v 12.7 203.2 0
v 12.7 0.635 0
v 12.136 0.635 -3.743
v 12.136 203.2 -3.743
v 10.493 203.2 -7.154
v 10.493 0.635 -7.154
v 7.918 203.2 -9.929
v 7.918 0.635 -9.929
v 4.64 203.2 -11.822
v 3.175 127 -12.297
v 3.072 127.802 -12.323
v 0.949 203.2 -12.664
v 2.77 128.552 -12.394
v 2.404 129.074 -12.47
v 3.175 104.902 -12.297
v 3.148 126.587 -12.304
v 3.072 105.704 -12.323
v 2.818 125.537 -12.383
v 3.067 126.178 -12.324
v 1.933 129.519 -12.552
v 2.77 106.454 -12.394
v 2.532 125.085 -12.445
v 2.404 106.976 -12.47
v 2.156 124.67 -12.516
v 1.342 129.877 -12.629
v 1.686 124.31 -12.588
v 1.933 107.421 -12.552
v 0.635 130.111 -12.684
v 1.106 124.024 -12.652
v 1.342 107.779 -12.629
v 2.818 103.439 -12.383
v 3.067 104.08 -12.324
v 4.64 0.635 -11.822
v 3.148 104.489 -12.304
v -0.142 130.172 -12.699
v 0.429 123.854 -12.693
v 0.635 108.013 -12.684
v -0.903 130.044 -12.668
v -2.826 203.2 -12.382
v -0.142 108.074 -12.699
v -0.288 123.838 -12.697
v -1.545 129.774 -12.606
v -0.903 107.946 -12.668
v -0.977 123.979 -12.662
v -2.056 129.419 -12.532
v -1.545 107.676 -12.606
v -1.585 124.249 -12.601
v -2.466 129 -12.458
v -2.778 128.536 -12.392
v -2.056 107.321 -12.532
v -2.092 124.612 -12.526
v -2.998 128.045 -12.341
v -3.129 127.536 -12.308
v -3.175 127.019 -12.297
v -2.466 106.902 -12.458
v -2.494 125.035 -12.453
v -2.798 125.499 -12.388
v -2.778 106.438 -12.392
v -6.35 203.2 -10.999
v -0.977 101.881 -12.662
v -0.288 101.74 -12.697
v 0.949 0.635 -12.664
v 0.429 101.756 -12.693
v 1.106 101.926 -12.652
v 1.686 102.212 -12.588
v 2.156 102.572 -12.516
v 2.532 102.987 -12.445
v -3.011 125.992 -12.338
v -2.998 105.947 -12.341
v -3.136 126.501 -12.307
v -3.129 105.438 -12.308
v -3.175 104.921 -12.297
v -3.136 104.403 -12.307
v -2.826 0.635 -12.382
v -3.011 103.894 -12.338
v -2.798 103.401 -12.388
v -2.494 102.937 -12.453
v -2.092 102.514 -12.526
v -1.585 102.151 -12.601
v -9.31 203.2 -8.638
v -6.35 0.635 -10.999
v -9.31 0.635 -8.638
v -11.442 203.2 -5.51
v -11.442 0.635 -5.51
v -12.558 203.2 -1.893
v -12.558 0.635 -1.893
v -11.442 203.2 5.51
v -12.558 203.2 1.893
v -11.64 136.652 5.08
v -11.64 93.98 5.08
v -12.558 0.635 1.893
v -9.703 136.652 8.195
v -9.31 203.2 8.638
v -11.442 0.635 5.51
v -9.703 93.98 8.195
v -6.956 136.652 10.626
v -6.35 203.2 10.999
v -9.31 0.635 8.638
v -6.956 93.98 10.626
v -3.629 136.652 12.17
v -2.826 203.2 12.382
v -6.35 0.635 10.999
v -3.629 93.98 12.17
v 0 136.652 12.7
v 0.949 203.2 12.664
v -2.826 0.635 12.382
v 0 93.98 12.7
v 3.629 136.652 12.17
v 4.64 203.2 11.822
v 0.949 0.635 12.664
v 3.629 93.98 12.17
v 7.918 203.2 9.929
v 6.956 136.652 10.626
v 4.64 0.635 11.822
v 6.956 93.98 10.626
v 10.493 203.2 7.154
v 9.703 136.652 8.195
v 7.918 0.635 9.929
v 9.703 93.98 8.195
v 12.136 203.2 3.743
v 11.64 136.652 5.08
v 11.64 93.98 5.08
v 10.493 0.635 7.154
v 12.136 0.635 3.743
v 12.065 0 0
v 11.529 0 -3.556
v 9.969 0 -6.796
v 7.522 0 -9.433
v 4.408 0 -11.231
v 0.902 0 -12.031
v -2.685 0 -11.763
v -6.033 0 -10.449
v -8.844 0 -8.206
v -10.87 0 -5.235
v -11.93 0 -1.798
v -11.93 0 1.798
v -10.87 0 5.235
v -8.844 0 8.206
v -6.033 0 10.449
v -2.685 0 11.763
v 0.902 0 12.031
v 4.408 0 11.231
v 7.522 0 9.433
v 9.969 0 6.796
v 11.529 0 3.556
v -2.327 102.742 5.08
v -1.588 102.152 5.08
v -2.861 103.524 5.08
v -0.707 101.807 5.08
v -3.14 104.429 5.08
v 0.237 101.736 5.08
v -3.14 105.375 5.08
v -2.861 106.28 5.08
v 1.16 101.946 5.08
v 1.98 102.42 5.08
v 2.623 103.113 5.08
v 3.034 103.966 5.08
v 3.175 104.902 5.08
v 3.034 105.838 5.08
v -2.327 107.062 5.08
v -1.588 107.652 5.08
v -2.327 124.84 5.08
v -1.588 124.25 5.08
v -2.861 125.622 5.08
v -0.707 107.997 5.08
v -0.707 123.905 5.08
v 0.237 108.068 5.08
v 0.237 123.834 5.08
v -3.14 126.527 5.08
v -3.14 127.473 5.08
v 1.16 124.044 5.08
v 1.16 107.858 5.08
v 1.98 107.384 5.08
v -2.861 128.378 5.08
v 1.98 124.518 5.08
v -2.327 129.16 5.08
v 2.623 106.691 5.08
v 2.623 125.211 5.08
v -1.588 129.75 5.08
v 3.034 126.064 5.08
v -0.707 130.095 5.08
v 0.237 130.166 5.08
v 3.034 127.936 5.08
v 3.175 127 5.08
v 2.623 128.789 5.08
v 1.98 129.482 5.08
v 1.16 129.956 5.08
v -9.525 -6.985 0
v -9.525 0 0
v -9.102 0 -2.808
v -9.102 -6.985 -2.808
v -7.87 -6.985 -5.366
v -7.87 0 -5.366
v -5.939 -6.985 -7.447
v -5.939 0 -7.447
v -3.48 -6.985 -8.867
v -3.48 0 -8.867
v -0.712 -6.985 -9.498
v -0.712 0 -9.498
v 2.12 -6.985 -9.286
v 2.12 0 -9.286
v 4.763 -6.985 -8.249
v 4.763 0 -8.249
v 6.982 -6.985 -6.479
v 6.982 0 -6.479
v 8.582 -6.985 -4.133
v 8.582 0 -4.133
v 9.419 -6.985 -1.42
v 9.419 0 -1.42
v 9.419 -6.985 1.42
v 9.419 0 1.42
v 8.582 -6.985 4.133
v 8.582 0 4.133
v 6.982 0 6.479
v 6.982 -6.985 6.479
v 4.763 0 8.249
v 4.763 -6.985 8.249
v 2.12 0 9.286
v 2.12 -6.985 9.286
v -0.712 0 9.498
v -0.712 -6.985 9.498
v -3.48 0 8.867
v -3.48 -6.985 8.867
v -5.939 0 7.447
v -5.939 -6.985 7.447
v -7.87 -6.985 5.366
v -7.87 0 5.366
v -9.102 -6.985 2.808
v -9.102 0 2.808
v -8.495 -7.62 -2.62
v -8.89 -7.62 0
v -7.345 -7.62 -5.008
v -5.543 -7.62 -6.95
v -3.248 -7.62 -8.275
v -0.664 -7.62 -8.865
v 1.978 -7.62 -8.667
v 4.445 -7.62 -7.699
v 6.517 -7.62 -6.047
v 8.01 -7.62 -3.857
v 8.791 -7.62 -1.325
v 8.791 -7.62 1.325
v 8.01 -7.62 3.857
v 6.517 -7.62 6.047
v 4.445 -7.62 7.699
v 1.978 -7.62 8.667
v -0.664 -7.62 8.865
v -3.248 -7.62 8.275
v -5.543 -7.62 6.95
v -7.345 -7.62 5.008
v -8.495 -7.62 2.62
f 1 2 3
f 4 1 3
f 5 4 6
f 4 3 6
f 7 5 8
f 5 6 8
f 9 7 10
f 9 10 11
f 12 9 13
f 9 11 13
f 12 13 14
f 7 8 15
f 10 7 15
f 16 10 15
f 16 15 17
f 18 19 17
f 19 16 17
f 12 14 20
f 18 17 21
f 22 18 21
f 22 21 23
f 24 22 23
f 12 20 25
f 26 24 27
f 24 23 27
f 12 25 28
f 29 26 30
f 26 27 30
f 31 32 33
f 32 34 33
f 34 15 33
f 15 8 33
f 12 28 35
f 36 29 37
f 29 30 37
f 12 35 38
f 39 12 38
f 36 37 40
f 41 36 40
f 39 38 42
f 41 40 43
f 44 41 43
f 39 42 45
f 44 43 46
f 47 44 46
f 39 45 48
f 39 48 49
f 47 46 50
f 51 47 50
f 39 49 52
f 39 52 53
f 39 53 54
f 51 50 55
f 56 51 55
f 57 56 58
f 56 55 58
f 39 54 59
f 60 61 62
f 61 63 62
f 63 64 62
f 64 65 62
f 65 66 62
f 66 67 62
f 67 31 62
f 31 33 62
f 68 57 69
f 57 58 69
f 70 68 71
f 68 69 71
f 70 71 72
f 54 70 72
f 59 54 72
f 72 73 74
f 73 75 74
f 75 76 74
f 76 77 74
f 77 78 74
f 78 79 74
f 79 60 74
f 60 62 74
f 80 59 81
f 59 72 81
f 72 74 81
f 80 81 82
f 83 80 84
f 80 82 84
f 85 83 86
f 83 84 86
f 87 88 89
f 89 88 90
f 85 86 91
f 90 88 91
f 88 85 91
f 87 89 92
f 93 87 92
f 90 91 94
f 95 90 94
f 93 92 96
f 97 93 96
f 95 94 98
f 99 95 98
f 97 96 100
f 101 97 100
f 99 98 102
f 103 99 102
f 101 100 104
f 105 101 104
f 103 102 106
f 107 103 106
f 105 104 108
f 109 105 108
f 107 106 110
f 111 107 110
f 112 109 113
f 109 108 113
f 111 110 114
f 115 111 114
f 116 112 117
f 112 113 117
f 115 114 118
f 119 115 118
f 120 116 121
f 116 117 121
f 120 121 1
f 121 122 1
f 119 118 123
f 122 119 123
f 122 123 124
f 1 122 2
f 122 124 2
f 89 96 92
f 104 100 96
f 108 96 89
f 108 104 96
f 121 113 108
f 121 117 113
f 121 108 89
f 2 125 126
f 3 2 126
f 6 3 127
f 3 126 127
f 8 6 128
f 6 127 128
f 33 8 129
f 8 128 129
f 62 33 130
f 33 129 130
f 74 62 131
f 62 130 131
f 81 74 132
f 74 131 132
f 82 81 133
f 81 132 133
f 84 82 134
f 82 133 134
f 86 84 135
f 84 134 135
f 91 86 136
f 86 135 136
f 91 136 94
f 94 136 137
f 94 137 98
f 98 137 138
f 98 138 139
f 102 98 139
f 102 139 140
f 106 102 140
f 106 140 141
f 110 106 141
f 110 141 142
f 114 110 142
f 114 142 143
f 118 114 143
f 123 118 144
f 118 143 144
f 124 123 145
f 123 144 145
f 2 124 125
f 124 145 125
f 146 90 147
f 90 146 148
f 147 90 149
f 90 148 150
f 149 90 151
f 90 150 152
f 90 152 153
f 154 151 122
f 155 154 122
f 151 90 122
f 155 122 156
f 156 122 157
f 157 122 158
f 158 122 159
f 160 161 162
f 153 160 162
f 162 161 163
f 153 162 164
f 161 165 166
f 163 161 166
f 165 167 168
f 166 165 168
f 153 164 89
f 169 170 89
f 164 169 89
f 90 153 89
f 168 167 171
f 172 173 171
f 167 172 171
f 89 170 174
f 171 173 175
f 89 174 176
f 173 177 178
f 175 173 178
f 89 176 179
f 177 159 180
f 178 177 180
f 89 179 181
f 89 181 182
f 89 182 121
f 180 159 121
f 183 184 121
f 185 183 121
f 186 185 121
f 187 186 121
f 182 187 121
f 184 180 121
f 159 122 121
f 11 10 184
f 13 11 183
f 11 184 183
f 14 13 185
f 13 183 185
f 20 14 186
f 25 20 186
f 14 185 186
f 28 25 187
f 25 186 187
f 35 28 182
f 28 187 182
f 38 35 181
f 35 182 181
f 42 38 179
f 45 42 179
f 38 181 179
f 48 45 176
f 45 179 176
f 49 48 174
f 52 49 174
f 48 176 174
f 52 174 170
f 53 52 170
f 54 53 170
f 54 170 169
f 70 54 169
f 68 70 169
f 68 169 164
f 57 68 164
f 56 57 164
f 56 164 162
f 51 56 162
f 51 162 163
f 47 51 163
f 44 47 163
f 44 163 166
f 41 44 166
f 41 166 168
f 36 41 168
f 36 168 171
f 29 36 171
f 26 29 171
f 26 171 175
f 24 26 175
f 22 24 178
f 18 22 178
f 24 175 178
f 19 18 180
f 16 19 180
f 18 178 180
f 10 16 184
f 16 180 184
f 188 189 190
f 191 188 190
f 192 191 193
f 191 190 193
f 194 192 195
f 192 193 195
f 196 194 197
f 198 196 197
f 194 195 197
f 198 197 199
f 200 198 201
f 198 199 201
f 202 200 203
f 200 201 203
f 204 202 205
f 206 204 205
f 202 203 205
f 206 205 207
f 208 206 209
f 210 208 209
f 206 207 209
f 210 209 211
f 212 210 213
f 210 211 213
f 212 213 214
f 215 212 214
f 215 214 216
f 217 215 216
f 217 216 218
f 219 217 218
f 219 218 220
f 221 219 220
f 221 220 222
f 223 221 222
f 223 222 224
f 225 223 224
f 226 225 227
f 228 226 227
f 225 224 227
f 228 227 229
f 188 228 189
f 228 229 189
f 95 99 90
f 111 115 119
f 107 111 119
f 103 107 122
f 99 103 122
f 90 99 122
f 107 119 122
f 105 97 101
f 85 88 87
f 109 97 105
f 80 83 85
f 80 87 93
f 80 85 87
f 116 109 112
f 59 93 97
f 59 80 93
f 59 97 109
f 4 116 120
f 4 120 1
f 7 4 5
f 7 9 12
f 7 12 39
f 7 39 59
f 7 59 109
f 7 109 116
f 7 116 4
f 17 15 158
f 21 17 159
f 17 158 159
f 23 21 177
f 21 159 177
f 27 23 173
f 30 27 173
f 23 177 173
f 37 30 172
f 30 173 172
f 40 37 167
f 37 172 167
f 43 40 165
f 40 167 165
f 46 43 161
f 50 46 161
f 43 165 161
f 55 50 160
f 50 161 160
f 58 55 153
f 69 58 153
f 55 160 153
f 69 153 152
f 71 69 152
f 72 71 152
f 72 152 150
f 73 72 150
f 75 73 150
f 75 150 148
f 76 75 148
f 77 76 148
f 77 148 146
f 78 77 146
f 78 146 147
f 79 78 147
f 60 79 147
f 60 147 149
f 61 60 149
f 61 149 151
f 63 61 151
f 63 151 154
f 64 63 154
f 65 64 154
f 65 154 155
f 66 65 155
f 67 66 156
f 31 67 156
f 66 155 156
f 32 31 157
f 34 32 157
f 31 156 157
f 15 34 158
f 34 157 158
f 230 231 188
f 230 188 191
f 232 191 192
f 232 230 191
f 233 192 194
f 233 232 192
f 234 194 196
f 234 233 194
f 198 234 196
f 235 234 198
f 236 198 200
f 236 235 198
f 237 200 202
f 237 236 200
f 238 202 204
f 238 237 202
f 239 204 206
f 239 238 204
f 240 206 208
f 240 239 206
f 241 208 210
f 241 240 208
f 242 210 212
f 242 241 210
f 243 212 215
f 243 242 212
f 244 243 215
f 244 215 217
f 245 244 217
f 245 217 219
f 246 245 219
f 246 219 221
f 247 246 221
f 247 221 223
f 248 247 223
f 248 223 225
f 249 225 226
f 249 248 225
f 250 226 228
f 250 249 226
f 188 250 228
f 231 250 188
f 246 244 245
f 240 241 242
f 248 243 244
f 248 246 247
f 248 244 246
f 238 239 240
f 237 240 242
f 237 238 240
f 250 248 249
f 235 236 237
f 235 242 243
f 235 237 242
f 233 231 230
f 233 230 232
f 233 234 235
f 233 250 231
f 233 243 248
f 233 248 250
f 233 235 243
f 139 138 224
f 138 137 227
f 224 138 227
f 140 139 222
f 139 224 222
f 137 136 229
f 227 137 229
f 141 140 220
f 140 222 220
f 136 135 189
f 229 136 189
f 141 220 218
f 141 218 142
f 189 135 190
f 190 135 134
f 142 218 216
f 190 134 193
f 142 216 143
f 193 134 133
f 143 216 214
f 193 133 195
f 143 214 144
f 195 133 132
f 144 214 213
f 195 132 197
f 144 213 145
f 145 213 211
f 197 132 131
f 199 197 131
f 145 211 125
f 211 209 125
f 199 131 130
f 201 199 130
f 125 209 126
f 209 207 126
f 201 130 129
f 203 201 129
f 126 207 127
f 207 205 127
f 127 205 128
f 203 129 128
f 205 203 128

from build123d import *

# Parameters (mm, degrees)
SKETCH1_R               = 12.7
BOSS_EXTRUDE1_DEPTH     = 203.2
SKETCH2_R               = 9.525
BOSS_EXTRUDE2_DEPTH     = 7.62
CHAMFER1_SIZE           = 0.635
CUT_EXTRUDE1_DEPTH      = 25.4
CUT_EXTRUDE1_DEPTH_BACK = 25.4
SKETCH4_W               = 7.62
SKETCH4_H               = 42.672
SKETCH5_R               = 3.175
CUT_EXTRUDE2_DEPTH      = 25.4


with BuildPart() as part:
    # Sketch1 → Boss-Extrude1 (new body)
    with BuildSketch(Plane(origin=(0, 0, 0), x_dir=(1, 0, 0), z_dir=(0, 1, 0))):
        Circle(SKETCH1_R)
    extrude(amount=BOSS_EXTRUDE1_DEPTH)

    # Sketch2 → Boss-Extrude2 (add)
    with BuildSketch(Plane(origin=(0, 0, 0), x_dir=(-1, 0, 0), z_dir=(0, -1, 0))):
        Circle(SKETCH2_R)
    extrude(amount=BOSS_EXTRUDE2_DEPTH)

    # Chamfer1
    chamfer1_edges = [part.edges().sort_by_distance(p)[0] for p in [
        (-12.7, 0, 0),
        (9.525, -7.62, 0),
    ]]
    chamfer(chamfer1_edges, length=CHAMFER1_SIZE)

    # Sketch4 → Cut-Extrude1 (cut, two sides: drawn at the far end of the back side and taken through both)
    with BuildSketch(Plane(origin=(0, 0, 0), x_dir=(0, 0, -1), z_dir=(1, 0, 0)).offset(-CUT_EXTRUDE1_DEPTH_BACK)):
        with Locations((-8.89, 115.316)):
            Rectangle(SKETCH4_W, SKETCH4_H)
    extrude(amount=CUT_EXTRUDE1_DEPTH + CUT_EXTRUDE1_DEPTH_BACK, mode=Mode.SUBTRACT)

    # Sketch5 → Cut-Extrude2 (cut)
    with BuildSketch(Plane.XY.offset(5.08)):
        with Locations((0, 104.902)):
            Circle(SKETCH5_R)
        with Locations((0, 127)):
            Circle(SKETCH5_R)
    extrude(amount=-CUT_EXTRUDE2_DEPTH, mode=Mode.SUBTRACT)


solid = part.part
